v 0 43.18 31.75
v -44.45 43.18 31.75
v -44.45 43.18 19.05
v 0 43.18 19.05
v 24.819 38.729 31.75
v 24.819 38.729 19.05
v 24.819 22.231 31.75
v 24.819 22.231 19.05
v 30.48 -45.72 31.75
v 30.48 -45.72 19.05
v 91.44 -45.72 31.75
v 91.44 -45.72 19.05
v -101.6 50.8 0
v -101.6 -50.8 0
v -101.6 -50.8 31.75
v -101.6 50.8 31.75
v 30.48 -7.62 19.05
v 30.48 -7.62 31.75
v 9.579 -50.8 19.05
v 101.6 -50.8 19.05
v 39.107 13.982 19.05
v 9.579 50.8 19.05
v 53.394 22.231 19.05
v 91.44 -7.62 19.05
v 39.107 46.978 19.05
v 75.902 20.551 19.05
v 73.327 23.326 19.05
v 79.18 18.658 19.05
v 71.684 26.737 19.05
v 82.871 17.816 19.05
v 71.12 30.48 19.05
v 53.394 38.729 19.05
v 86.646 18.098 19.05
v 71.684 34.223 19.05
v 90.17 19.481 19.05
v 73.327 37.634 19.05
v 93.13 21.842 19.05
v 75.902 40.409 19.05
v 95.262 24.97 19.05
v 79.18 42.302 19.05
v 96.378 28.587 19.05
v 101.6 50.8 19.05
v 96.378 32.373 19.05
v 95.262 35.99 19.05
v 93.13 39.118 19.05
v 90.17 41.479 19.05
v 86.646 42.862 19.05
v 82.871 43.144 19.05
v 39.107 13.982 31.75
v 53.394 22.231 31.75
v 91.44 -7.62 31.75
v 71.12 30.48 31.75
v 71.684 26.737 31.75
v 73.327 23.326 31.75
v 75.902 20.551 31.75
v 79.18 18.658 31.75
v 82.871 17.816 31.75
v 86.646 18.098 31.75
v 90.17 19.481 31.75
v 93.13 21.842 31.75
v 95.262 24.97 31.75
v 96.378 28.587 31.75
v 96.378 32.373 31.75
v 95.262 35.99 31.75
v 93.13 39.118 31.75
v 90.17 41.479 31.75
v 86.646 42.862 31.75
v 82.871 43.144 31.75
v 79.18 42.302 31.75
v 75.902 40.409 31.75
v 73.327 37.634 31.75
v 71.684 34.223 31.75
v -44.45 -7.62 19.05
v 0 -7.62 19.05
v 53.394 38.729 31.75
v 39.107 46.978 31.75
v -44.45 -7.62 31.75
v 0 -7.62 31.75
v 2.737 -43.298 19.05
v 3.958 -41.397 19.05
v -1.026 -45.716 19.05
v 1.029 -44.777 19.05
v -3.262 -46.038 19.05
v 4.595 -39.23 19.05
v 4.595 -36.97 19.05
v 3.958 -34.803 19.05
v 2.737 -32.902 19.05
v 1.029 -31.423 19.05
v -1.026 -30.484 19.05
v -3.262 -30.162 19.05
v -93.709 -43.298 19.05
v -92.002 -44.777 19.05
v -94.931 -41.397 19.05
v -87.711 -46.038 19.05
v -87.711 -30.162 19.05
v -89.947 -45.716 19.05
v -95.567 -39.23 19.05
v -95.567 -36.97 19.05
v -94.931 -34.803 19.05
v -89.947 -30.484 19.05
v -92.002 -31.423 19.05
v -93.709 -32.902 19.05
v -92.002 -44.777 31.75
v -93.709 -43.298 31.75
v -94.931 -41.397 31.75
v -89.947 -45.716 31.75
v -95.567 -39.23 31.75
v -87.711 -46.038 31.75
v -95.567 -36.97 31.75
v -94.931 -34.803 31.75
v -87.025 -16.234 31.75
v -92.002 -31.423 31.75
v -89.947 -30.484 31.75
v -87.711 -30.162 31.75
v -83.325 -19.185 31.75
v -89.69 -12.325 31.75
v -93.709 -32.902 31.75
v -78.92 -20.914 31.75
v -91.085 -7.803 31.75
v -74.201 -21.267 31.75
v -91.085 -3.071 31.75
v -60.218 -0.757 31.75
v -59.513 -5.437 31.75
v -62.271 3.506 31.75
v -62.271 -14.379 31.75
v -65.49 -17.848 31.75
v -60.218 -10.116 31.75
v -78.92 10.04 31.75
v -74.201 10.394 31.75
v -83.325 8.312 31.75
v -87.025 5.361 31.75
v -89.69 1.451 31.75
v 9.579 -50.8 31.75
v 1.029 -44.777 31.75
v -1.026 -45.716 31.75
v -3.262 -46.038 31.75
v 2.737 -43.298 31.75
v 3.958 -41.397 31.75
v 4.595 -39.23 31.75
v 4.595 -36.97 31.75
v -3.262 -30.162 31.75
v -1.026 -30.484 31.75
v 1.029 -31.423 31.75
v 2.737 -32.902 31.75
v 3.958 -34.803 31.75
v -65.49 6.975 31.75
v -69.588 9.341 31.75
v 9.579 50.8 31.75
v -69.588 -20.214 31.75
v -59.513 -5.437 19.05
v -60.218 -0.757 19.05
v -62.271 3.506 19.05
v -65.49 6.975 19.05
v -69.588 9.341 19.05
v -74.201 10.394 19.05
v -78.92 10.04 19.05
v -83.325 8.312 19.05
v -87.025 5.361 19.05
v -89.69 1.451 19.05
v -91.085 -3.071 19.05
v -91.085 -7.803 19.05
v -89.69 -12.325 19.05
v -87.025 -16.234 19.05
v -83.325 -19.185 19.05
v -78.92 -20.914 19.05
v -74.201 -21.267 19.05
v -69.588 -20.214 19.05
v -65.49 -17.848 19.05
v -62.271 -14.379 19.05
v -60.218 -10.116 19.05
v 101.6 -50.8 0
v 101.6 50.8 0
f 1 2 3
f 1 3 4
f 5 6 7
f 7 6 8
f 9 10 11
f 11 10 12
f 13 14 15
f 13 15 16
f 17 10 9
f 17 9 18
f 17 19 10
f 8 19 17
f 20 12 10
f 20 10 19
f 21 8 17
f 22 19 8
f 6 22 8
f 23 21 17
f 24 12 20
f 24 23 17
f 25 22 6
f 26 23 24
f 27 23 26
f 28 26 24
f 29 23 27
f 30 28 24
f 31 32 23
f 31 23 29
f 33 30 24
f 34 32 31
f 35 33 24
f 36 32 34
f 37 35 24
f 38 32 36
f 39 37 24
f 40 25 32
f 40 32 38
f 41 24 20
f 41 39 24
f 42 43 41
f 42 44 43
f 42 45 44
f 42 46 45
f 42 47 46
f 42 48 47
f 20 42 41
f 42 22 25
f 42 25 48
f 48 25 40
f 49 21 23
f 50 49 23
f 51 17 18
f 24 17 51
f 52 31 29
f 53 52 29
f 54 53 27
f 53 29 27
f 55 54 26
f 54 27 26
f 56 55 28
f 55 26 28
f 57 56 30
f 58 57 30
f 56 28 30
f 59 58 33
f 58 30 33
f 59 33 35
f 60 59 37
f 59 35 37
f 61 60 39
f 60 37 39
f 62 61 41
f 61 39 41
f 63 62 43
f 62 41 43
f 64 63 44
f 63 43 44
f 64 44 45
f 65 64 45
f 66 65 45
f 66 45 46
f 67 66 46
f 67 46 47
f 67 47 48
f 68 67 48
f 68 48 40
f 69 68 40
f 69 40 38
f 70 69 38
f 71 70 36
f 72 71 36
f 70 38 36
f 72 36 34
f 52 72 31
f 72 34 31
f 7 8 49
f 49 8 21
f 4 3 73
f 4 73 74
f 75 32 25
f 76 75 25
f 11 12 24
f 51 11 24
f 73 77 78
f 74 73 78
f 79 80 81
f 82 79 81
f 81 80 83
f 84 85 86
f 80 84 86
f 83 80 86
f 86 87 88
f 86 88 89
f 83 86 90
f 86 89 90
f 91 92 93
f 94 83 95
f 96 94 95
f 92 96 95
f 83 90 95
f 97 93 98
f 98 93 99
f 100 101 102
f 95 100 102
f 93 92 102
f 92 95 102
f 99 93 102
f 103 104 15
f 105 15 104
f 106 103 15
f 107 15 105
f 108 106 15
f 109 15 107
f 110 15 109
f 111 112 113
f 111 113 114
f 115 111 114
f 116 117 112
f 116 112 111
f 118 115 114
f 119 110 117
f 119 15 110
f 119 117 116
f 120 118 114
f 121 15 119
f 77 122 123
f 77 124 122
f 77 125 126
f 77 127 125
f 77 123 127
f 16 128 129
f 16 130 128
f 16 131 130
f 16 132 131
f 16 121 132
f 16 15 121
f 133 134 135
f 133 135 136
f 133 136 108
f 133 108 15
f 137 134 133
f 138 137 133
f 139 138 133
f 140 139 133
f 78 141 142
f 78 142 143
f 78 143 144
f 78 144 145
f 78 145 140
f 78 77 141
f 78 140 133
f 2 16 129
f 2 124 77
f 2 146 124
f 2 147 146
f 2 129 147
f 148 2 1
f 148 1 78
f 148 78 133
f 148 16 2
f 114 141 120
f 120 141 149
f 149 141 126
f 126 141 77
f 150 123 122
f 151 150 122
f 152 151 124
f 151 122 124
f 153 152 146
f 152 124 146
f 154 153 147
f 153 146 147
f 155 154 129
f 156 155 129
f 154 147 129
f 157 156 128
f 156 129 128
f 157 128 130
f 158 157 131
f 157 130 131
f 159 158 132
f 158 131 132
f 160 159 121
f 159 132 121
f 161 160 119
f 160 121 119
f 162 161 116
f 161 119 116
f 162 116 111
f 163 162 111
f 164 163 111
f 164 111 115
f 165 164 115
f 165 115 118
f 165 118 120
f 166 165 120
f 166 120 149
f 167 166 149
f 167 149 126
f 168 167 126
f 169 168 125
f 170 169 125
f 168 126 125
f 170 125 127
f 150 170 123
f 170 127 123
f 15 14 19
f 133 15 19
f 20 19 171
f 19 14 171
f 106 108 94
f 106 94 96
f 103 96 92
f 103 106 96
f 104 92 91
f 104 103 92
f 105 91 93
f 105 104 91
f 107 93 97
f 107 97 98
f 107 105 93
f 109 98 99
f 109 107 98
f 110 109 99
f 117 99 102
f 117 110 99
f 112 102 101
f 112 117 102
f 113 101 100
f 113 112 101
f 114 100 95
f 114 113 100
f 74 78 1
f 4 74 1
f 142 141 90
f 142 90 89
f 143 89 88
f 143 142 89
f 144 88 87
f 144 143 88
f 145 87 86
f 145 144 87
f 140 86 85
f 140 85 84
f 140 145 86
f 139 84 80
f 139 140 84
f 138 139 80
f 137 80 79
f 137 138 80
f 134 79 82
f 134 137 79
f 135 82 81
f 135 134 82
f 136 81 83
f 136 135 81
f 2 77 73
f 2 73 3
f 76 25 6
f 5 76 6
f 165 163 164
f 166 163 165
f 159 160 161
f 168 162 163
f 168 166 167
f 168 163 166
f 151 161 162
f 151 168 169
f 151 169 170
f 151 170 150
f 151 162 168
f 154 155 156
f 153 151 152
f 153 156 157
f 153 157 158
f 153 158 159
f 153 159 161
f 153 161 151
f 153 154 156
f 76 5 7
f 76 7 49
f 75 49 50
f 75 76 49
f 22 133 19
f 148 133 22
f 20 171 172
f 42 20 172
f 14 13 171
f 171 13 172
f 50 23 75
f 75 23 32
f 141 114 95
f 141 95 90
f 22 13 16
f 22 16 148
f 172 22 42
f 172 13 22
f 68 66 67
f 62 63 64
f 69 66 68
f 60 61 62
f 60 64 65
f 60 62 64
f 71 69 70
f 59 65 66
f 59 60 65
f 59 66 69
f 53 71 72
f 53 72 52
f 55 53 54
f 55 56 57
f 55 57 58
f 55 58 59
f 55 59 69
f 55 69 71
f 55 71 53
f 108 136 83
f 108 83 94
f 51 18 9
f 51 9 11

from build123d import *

# Parameters (mm, degrees)
SKETCH2_W           = 203.2
SKETCH2_H           = 101.6
BOSS_EXTRUDE1_DEPTH = 31.75
SKETCH3_W           = 92.020686849
SKETCH3_H           = 101.6
CUT_EXTRUDE1_DEPTH  = 12.7
SKETCH4_R           = 12.7
SKETCH4_W           = 60.96
SKETCH4_H           = 38.1
BOSS_EXTRUDE2_DEPTH = 12.7
SKETCH6_R           = 15.875
SKETCH6_W           = 44.45
SKETCH6_H           = 50.8
CUT_EXTRUDE2_DEPTH  = 12.7
BOSS_EXTRUDE3_DEPTH = 12.7


with BuildPart() as part:
    # Sketch2 → Boss-Extrude1 (new body)
    with BuildSketch(Plane.XY):
        Rectangle(SKETCH2_W, SKETCH2_H)
    extrude(amount=BOSS_EXTRUDE1_DEPTH)

    # Sketch3 → Cut-Extrude1 (cut)
    with BuildSketch(Plane.XY.offset(31.75)):
        with Locations((55.589656576, 0)):
            Rectangle(SKETCH3_W, SKETCH3_H)
    extrude(amount=-CUT_EXTRUDE1_DEPTH, mode=Mode.SUBTRACT)

    # Sketch4 → Boss-Extrude2 (add)
    with BuildSketch(Plane.XY.offset(19.05)):
        with Locations(Location((83.82, 30.48, 0), (0, 0, 180))):  # turned: the seam where the file's is
            Circle(SKETCH4_R)
        with Locations((60.96, -26.67)):
            Rectangle(SKETCH4_W, SKETCH4_H)
    extrude(amount=BOSS_EXTRUDE2_DEPTH)

    # Sketch6 → Cut-Extrude2 (cut)
    with BuildSketch(Plane.XY.offset(31.75)):
        with Locations((-75.387587267, -5.436604851)):
            Circle(SKETCH6_R)
        with BuildLine():
            Line((-87.710558262, -30.1625), (-3.261962911, -30.1625))
            ThreePointArc((-3.261962911, -30.1625), (4.675537089, -38.1), (-3.261962911, -46.0375))
            Line((-3.261962911, -46.0375), (-87.710558262, -46.0375))
            ThreePointArc((-87.710558262, -46.0375), (-95.648058262, -38.1), (-87.710558262, -30.1625))
        make_face()
        with Locations((-22.225, 17.78)):
            Rectangle(SKETCH6_W, SKETCH6_H)
    extrude(amount=-CUT_EXTRUDE2_DEPTH, mode=Mode.SUBTRACT)

    # Sketch7 → Boss-Extrude3 (add)
    with BuildSketch(Plane.XY.offset(19.05)):
        Polygon((39.106813151, 46.977783942), (24.819313151, 38.728891971), (24.819313151, 22.231108029), (39.106813151, 13.982216058), (53.394313151, 22.231108029), (53.394313151, 38.728891971), align=None)
    extrude(amount=BOSS_EXTRUDE3_DEPTH)


solid = part.part
